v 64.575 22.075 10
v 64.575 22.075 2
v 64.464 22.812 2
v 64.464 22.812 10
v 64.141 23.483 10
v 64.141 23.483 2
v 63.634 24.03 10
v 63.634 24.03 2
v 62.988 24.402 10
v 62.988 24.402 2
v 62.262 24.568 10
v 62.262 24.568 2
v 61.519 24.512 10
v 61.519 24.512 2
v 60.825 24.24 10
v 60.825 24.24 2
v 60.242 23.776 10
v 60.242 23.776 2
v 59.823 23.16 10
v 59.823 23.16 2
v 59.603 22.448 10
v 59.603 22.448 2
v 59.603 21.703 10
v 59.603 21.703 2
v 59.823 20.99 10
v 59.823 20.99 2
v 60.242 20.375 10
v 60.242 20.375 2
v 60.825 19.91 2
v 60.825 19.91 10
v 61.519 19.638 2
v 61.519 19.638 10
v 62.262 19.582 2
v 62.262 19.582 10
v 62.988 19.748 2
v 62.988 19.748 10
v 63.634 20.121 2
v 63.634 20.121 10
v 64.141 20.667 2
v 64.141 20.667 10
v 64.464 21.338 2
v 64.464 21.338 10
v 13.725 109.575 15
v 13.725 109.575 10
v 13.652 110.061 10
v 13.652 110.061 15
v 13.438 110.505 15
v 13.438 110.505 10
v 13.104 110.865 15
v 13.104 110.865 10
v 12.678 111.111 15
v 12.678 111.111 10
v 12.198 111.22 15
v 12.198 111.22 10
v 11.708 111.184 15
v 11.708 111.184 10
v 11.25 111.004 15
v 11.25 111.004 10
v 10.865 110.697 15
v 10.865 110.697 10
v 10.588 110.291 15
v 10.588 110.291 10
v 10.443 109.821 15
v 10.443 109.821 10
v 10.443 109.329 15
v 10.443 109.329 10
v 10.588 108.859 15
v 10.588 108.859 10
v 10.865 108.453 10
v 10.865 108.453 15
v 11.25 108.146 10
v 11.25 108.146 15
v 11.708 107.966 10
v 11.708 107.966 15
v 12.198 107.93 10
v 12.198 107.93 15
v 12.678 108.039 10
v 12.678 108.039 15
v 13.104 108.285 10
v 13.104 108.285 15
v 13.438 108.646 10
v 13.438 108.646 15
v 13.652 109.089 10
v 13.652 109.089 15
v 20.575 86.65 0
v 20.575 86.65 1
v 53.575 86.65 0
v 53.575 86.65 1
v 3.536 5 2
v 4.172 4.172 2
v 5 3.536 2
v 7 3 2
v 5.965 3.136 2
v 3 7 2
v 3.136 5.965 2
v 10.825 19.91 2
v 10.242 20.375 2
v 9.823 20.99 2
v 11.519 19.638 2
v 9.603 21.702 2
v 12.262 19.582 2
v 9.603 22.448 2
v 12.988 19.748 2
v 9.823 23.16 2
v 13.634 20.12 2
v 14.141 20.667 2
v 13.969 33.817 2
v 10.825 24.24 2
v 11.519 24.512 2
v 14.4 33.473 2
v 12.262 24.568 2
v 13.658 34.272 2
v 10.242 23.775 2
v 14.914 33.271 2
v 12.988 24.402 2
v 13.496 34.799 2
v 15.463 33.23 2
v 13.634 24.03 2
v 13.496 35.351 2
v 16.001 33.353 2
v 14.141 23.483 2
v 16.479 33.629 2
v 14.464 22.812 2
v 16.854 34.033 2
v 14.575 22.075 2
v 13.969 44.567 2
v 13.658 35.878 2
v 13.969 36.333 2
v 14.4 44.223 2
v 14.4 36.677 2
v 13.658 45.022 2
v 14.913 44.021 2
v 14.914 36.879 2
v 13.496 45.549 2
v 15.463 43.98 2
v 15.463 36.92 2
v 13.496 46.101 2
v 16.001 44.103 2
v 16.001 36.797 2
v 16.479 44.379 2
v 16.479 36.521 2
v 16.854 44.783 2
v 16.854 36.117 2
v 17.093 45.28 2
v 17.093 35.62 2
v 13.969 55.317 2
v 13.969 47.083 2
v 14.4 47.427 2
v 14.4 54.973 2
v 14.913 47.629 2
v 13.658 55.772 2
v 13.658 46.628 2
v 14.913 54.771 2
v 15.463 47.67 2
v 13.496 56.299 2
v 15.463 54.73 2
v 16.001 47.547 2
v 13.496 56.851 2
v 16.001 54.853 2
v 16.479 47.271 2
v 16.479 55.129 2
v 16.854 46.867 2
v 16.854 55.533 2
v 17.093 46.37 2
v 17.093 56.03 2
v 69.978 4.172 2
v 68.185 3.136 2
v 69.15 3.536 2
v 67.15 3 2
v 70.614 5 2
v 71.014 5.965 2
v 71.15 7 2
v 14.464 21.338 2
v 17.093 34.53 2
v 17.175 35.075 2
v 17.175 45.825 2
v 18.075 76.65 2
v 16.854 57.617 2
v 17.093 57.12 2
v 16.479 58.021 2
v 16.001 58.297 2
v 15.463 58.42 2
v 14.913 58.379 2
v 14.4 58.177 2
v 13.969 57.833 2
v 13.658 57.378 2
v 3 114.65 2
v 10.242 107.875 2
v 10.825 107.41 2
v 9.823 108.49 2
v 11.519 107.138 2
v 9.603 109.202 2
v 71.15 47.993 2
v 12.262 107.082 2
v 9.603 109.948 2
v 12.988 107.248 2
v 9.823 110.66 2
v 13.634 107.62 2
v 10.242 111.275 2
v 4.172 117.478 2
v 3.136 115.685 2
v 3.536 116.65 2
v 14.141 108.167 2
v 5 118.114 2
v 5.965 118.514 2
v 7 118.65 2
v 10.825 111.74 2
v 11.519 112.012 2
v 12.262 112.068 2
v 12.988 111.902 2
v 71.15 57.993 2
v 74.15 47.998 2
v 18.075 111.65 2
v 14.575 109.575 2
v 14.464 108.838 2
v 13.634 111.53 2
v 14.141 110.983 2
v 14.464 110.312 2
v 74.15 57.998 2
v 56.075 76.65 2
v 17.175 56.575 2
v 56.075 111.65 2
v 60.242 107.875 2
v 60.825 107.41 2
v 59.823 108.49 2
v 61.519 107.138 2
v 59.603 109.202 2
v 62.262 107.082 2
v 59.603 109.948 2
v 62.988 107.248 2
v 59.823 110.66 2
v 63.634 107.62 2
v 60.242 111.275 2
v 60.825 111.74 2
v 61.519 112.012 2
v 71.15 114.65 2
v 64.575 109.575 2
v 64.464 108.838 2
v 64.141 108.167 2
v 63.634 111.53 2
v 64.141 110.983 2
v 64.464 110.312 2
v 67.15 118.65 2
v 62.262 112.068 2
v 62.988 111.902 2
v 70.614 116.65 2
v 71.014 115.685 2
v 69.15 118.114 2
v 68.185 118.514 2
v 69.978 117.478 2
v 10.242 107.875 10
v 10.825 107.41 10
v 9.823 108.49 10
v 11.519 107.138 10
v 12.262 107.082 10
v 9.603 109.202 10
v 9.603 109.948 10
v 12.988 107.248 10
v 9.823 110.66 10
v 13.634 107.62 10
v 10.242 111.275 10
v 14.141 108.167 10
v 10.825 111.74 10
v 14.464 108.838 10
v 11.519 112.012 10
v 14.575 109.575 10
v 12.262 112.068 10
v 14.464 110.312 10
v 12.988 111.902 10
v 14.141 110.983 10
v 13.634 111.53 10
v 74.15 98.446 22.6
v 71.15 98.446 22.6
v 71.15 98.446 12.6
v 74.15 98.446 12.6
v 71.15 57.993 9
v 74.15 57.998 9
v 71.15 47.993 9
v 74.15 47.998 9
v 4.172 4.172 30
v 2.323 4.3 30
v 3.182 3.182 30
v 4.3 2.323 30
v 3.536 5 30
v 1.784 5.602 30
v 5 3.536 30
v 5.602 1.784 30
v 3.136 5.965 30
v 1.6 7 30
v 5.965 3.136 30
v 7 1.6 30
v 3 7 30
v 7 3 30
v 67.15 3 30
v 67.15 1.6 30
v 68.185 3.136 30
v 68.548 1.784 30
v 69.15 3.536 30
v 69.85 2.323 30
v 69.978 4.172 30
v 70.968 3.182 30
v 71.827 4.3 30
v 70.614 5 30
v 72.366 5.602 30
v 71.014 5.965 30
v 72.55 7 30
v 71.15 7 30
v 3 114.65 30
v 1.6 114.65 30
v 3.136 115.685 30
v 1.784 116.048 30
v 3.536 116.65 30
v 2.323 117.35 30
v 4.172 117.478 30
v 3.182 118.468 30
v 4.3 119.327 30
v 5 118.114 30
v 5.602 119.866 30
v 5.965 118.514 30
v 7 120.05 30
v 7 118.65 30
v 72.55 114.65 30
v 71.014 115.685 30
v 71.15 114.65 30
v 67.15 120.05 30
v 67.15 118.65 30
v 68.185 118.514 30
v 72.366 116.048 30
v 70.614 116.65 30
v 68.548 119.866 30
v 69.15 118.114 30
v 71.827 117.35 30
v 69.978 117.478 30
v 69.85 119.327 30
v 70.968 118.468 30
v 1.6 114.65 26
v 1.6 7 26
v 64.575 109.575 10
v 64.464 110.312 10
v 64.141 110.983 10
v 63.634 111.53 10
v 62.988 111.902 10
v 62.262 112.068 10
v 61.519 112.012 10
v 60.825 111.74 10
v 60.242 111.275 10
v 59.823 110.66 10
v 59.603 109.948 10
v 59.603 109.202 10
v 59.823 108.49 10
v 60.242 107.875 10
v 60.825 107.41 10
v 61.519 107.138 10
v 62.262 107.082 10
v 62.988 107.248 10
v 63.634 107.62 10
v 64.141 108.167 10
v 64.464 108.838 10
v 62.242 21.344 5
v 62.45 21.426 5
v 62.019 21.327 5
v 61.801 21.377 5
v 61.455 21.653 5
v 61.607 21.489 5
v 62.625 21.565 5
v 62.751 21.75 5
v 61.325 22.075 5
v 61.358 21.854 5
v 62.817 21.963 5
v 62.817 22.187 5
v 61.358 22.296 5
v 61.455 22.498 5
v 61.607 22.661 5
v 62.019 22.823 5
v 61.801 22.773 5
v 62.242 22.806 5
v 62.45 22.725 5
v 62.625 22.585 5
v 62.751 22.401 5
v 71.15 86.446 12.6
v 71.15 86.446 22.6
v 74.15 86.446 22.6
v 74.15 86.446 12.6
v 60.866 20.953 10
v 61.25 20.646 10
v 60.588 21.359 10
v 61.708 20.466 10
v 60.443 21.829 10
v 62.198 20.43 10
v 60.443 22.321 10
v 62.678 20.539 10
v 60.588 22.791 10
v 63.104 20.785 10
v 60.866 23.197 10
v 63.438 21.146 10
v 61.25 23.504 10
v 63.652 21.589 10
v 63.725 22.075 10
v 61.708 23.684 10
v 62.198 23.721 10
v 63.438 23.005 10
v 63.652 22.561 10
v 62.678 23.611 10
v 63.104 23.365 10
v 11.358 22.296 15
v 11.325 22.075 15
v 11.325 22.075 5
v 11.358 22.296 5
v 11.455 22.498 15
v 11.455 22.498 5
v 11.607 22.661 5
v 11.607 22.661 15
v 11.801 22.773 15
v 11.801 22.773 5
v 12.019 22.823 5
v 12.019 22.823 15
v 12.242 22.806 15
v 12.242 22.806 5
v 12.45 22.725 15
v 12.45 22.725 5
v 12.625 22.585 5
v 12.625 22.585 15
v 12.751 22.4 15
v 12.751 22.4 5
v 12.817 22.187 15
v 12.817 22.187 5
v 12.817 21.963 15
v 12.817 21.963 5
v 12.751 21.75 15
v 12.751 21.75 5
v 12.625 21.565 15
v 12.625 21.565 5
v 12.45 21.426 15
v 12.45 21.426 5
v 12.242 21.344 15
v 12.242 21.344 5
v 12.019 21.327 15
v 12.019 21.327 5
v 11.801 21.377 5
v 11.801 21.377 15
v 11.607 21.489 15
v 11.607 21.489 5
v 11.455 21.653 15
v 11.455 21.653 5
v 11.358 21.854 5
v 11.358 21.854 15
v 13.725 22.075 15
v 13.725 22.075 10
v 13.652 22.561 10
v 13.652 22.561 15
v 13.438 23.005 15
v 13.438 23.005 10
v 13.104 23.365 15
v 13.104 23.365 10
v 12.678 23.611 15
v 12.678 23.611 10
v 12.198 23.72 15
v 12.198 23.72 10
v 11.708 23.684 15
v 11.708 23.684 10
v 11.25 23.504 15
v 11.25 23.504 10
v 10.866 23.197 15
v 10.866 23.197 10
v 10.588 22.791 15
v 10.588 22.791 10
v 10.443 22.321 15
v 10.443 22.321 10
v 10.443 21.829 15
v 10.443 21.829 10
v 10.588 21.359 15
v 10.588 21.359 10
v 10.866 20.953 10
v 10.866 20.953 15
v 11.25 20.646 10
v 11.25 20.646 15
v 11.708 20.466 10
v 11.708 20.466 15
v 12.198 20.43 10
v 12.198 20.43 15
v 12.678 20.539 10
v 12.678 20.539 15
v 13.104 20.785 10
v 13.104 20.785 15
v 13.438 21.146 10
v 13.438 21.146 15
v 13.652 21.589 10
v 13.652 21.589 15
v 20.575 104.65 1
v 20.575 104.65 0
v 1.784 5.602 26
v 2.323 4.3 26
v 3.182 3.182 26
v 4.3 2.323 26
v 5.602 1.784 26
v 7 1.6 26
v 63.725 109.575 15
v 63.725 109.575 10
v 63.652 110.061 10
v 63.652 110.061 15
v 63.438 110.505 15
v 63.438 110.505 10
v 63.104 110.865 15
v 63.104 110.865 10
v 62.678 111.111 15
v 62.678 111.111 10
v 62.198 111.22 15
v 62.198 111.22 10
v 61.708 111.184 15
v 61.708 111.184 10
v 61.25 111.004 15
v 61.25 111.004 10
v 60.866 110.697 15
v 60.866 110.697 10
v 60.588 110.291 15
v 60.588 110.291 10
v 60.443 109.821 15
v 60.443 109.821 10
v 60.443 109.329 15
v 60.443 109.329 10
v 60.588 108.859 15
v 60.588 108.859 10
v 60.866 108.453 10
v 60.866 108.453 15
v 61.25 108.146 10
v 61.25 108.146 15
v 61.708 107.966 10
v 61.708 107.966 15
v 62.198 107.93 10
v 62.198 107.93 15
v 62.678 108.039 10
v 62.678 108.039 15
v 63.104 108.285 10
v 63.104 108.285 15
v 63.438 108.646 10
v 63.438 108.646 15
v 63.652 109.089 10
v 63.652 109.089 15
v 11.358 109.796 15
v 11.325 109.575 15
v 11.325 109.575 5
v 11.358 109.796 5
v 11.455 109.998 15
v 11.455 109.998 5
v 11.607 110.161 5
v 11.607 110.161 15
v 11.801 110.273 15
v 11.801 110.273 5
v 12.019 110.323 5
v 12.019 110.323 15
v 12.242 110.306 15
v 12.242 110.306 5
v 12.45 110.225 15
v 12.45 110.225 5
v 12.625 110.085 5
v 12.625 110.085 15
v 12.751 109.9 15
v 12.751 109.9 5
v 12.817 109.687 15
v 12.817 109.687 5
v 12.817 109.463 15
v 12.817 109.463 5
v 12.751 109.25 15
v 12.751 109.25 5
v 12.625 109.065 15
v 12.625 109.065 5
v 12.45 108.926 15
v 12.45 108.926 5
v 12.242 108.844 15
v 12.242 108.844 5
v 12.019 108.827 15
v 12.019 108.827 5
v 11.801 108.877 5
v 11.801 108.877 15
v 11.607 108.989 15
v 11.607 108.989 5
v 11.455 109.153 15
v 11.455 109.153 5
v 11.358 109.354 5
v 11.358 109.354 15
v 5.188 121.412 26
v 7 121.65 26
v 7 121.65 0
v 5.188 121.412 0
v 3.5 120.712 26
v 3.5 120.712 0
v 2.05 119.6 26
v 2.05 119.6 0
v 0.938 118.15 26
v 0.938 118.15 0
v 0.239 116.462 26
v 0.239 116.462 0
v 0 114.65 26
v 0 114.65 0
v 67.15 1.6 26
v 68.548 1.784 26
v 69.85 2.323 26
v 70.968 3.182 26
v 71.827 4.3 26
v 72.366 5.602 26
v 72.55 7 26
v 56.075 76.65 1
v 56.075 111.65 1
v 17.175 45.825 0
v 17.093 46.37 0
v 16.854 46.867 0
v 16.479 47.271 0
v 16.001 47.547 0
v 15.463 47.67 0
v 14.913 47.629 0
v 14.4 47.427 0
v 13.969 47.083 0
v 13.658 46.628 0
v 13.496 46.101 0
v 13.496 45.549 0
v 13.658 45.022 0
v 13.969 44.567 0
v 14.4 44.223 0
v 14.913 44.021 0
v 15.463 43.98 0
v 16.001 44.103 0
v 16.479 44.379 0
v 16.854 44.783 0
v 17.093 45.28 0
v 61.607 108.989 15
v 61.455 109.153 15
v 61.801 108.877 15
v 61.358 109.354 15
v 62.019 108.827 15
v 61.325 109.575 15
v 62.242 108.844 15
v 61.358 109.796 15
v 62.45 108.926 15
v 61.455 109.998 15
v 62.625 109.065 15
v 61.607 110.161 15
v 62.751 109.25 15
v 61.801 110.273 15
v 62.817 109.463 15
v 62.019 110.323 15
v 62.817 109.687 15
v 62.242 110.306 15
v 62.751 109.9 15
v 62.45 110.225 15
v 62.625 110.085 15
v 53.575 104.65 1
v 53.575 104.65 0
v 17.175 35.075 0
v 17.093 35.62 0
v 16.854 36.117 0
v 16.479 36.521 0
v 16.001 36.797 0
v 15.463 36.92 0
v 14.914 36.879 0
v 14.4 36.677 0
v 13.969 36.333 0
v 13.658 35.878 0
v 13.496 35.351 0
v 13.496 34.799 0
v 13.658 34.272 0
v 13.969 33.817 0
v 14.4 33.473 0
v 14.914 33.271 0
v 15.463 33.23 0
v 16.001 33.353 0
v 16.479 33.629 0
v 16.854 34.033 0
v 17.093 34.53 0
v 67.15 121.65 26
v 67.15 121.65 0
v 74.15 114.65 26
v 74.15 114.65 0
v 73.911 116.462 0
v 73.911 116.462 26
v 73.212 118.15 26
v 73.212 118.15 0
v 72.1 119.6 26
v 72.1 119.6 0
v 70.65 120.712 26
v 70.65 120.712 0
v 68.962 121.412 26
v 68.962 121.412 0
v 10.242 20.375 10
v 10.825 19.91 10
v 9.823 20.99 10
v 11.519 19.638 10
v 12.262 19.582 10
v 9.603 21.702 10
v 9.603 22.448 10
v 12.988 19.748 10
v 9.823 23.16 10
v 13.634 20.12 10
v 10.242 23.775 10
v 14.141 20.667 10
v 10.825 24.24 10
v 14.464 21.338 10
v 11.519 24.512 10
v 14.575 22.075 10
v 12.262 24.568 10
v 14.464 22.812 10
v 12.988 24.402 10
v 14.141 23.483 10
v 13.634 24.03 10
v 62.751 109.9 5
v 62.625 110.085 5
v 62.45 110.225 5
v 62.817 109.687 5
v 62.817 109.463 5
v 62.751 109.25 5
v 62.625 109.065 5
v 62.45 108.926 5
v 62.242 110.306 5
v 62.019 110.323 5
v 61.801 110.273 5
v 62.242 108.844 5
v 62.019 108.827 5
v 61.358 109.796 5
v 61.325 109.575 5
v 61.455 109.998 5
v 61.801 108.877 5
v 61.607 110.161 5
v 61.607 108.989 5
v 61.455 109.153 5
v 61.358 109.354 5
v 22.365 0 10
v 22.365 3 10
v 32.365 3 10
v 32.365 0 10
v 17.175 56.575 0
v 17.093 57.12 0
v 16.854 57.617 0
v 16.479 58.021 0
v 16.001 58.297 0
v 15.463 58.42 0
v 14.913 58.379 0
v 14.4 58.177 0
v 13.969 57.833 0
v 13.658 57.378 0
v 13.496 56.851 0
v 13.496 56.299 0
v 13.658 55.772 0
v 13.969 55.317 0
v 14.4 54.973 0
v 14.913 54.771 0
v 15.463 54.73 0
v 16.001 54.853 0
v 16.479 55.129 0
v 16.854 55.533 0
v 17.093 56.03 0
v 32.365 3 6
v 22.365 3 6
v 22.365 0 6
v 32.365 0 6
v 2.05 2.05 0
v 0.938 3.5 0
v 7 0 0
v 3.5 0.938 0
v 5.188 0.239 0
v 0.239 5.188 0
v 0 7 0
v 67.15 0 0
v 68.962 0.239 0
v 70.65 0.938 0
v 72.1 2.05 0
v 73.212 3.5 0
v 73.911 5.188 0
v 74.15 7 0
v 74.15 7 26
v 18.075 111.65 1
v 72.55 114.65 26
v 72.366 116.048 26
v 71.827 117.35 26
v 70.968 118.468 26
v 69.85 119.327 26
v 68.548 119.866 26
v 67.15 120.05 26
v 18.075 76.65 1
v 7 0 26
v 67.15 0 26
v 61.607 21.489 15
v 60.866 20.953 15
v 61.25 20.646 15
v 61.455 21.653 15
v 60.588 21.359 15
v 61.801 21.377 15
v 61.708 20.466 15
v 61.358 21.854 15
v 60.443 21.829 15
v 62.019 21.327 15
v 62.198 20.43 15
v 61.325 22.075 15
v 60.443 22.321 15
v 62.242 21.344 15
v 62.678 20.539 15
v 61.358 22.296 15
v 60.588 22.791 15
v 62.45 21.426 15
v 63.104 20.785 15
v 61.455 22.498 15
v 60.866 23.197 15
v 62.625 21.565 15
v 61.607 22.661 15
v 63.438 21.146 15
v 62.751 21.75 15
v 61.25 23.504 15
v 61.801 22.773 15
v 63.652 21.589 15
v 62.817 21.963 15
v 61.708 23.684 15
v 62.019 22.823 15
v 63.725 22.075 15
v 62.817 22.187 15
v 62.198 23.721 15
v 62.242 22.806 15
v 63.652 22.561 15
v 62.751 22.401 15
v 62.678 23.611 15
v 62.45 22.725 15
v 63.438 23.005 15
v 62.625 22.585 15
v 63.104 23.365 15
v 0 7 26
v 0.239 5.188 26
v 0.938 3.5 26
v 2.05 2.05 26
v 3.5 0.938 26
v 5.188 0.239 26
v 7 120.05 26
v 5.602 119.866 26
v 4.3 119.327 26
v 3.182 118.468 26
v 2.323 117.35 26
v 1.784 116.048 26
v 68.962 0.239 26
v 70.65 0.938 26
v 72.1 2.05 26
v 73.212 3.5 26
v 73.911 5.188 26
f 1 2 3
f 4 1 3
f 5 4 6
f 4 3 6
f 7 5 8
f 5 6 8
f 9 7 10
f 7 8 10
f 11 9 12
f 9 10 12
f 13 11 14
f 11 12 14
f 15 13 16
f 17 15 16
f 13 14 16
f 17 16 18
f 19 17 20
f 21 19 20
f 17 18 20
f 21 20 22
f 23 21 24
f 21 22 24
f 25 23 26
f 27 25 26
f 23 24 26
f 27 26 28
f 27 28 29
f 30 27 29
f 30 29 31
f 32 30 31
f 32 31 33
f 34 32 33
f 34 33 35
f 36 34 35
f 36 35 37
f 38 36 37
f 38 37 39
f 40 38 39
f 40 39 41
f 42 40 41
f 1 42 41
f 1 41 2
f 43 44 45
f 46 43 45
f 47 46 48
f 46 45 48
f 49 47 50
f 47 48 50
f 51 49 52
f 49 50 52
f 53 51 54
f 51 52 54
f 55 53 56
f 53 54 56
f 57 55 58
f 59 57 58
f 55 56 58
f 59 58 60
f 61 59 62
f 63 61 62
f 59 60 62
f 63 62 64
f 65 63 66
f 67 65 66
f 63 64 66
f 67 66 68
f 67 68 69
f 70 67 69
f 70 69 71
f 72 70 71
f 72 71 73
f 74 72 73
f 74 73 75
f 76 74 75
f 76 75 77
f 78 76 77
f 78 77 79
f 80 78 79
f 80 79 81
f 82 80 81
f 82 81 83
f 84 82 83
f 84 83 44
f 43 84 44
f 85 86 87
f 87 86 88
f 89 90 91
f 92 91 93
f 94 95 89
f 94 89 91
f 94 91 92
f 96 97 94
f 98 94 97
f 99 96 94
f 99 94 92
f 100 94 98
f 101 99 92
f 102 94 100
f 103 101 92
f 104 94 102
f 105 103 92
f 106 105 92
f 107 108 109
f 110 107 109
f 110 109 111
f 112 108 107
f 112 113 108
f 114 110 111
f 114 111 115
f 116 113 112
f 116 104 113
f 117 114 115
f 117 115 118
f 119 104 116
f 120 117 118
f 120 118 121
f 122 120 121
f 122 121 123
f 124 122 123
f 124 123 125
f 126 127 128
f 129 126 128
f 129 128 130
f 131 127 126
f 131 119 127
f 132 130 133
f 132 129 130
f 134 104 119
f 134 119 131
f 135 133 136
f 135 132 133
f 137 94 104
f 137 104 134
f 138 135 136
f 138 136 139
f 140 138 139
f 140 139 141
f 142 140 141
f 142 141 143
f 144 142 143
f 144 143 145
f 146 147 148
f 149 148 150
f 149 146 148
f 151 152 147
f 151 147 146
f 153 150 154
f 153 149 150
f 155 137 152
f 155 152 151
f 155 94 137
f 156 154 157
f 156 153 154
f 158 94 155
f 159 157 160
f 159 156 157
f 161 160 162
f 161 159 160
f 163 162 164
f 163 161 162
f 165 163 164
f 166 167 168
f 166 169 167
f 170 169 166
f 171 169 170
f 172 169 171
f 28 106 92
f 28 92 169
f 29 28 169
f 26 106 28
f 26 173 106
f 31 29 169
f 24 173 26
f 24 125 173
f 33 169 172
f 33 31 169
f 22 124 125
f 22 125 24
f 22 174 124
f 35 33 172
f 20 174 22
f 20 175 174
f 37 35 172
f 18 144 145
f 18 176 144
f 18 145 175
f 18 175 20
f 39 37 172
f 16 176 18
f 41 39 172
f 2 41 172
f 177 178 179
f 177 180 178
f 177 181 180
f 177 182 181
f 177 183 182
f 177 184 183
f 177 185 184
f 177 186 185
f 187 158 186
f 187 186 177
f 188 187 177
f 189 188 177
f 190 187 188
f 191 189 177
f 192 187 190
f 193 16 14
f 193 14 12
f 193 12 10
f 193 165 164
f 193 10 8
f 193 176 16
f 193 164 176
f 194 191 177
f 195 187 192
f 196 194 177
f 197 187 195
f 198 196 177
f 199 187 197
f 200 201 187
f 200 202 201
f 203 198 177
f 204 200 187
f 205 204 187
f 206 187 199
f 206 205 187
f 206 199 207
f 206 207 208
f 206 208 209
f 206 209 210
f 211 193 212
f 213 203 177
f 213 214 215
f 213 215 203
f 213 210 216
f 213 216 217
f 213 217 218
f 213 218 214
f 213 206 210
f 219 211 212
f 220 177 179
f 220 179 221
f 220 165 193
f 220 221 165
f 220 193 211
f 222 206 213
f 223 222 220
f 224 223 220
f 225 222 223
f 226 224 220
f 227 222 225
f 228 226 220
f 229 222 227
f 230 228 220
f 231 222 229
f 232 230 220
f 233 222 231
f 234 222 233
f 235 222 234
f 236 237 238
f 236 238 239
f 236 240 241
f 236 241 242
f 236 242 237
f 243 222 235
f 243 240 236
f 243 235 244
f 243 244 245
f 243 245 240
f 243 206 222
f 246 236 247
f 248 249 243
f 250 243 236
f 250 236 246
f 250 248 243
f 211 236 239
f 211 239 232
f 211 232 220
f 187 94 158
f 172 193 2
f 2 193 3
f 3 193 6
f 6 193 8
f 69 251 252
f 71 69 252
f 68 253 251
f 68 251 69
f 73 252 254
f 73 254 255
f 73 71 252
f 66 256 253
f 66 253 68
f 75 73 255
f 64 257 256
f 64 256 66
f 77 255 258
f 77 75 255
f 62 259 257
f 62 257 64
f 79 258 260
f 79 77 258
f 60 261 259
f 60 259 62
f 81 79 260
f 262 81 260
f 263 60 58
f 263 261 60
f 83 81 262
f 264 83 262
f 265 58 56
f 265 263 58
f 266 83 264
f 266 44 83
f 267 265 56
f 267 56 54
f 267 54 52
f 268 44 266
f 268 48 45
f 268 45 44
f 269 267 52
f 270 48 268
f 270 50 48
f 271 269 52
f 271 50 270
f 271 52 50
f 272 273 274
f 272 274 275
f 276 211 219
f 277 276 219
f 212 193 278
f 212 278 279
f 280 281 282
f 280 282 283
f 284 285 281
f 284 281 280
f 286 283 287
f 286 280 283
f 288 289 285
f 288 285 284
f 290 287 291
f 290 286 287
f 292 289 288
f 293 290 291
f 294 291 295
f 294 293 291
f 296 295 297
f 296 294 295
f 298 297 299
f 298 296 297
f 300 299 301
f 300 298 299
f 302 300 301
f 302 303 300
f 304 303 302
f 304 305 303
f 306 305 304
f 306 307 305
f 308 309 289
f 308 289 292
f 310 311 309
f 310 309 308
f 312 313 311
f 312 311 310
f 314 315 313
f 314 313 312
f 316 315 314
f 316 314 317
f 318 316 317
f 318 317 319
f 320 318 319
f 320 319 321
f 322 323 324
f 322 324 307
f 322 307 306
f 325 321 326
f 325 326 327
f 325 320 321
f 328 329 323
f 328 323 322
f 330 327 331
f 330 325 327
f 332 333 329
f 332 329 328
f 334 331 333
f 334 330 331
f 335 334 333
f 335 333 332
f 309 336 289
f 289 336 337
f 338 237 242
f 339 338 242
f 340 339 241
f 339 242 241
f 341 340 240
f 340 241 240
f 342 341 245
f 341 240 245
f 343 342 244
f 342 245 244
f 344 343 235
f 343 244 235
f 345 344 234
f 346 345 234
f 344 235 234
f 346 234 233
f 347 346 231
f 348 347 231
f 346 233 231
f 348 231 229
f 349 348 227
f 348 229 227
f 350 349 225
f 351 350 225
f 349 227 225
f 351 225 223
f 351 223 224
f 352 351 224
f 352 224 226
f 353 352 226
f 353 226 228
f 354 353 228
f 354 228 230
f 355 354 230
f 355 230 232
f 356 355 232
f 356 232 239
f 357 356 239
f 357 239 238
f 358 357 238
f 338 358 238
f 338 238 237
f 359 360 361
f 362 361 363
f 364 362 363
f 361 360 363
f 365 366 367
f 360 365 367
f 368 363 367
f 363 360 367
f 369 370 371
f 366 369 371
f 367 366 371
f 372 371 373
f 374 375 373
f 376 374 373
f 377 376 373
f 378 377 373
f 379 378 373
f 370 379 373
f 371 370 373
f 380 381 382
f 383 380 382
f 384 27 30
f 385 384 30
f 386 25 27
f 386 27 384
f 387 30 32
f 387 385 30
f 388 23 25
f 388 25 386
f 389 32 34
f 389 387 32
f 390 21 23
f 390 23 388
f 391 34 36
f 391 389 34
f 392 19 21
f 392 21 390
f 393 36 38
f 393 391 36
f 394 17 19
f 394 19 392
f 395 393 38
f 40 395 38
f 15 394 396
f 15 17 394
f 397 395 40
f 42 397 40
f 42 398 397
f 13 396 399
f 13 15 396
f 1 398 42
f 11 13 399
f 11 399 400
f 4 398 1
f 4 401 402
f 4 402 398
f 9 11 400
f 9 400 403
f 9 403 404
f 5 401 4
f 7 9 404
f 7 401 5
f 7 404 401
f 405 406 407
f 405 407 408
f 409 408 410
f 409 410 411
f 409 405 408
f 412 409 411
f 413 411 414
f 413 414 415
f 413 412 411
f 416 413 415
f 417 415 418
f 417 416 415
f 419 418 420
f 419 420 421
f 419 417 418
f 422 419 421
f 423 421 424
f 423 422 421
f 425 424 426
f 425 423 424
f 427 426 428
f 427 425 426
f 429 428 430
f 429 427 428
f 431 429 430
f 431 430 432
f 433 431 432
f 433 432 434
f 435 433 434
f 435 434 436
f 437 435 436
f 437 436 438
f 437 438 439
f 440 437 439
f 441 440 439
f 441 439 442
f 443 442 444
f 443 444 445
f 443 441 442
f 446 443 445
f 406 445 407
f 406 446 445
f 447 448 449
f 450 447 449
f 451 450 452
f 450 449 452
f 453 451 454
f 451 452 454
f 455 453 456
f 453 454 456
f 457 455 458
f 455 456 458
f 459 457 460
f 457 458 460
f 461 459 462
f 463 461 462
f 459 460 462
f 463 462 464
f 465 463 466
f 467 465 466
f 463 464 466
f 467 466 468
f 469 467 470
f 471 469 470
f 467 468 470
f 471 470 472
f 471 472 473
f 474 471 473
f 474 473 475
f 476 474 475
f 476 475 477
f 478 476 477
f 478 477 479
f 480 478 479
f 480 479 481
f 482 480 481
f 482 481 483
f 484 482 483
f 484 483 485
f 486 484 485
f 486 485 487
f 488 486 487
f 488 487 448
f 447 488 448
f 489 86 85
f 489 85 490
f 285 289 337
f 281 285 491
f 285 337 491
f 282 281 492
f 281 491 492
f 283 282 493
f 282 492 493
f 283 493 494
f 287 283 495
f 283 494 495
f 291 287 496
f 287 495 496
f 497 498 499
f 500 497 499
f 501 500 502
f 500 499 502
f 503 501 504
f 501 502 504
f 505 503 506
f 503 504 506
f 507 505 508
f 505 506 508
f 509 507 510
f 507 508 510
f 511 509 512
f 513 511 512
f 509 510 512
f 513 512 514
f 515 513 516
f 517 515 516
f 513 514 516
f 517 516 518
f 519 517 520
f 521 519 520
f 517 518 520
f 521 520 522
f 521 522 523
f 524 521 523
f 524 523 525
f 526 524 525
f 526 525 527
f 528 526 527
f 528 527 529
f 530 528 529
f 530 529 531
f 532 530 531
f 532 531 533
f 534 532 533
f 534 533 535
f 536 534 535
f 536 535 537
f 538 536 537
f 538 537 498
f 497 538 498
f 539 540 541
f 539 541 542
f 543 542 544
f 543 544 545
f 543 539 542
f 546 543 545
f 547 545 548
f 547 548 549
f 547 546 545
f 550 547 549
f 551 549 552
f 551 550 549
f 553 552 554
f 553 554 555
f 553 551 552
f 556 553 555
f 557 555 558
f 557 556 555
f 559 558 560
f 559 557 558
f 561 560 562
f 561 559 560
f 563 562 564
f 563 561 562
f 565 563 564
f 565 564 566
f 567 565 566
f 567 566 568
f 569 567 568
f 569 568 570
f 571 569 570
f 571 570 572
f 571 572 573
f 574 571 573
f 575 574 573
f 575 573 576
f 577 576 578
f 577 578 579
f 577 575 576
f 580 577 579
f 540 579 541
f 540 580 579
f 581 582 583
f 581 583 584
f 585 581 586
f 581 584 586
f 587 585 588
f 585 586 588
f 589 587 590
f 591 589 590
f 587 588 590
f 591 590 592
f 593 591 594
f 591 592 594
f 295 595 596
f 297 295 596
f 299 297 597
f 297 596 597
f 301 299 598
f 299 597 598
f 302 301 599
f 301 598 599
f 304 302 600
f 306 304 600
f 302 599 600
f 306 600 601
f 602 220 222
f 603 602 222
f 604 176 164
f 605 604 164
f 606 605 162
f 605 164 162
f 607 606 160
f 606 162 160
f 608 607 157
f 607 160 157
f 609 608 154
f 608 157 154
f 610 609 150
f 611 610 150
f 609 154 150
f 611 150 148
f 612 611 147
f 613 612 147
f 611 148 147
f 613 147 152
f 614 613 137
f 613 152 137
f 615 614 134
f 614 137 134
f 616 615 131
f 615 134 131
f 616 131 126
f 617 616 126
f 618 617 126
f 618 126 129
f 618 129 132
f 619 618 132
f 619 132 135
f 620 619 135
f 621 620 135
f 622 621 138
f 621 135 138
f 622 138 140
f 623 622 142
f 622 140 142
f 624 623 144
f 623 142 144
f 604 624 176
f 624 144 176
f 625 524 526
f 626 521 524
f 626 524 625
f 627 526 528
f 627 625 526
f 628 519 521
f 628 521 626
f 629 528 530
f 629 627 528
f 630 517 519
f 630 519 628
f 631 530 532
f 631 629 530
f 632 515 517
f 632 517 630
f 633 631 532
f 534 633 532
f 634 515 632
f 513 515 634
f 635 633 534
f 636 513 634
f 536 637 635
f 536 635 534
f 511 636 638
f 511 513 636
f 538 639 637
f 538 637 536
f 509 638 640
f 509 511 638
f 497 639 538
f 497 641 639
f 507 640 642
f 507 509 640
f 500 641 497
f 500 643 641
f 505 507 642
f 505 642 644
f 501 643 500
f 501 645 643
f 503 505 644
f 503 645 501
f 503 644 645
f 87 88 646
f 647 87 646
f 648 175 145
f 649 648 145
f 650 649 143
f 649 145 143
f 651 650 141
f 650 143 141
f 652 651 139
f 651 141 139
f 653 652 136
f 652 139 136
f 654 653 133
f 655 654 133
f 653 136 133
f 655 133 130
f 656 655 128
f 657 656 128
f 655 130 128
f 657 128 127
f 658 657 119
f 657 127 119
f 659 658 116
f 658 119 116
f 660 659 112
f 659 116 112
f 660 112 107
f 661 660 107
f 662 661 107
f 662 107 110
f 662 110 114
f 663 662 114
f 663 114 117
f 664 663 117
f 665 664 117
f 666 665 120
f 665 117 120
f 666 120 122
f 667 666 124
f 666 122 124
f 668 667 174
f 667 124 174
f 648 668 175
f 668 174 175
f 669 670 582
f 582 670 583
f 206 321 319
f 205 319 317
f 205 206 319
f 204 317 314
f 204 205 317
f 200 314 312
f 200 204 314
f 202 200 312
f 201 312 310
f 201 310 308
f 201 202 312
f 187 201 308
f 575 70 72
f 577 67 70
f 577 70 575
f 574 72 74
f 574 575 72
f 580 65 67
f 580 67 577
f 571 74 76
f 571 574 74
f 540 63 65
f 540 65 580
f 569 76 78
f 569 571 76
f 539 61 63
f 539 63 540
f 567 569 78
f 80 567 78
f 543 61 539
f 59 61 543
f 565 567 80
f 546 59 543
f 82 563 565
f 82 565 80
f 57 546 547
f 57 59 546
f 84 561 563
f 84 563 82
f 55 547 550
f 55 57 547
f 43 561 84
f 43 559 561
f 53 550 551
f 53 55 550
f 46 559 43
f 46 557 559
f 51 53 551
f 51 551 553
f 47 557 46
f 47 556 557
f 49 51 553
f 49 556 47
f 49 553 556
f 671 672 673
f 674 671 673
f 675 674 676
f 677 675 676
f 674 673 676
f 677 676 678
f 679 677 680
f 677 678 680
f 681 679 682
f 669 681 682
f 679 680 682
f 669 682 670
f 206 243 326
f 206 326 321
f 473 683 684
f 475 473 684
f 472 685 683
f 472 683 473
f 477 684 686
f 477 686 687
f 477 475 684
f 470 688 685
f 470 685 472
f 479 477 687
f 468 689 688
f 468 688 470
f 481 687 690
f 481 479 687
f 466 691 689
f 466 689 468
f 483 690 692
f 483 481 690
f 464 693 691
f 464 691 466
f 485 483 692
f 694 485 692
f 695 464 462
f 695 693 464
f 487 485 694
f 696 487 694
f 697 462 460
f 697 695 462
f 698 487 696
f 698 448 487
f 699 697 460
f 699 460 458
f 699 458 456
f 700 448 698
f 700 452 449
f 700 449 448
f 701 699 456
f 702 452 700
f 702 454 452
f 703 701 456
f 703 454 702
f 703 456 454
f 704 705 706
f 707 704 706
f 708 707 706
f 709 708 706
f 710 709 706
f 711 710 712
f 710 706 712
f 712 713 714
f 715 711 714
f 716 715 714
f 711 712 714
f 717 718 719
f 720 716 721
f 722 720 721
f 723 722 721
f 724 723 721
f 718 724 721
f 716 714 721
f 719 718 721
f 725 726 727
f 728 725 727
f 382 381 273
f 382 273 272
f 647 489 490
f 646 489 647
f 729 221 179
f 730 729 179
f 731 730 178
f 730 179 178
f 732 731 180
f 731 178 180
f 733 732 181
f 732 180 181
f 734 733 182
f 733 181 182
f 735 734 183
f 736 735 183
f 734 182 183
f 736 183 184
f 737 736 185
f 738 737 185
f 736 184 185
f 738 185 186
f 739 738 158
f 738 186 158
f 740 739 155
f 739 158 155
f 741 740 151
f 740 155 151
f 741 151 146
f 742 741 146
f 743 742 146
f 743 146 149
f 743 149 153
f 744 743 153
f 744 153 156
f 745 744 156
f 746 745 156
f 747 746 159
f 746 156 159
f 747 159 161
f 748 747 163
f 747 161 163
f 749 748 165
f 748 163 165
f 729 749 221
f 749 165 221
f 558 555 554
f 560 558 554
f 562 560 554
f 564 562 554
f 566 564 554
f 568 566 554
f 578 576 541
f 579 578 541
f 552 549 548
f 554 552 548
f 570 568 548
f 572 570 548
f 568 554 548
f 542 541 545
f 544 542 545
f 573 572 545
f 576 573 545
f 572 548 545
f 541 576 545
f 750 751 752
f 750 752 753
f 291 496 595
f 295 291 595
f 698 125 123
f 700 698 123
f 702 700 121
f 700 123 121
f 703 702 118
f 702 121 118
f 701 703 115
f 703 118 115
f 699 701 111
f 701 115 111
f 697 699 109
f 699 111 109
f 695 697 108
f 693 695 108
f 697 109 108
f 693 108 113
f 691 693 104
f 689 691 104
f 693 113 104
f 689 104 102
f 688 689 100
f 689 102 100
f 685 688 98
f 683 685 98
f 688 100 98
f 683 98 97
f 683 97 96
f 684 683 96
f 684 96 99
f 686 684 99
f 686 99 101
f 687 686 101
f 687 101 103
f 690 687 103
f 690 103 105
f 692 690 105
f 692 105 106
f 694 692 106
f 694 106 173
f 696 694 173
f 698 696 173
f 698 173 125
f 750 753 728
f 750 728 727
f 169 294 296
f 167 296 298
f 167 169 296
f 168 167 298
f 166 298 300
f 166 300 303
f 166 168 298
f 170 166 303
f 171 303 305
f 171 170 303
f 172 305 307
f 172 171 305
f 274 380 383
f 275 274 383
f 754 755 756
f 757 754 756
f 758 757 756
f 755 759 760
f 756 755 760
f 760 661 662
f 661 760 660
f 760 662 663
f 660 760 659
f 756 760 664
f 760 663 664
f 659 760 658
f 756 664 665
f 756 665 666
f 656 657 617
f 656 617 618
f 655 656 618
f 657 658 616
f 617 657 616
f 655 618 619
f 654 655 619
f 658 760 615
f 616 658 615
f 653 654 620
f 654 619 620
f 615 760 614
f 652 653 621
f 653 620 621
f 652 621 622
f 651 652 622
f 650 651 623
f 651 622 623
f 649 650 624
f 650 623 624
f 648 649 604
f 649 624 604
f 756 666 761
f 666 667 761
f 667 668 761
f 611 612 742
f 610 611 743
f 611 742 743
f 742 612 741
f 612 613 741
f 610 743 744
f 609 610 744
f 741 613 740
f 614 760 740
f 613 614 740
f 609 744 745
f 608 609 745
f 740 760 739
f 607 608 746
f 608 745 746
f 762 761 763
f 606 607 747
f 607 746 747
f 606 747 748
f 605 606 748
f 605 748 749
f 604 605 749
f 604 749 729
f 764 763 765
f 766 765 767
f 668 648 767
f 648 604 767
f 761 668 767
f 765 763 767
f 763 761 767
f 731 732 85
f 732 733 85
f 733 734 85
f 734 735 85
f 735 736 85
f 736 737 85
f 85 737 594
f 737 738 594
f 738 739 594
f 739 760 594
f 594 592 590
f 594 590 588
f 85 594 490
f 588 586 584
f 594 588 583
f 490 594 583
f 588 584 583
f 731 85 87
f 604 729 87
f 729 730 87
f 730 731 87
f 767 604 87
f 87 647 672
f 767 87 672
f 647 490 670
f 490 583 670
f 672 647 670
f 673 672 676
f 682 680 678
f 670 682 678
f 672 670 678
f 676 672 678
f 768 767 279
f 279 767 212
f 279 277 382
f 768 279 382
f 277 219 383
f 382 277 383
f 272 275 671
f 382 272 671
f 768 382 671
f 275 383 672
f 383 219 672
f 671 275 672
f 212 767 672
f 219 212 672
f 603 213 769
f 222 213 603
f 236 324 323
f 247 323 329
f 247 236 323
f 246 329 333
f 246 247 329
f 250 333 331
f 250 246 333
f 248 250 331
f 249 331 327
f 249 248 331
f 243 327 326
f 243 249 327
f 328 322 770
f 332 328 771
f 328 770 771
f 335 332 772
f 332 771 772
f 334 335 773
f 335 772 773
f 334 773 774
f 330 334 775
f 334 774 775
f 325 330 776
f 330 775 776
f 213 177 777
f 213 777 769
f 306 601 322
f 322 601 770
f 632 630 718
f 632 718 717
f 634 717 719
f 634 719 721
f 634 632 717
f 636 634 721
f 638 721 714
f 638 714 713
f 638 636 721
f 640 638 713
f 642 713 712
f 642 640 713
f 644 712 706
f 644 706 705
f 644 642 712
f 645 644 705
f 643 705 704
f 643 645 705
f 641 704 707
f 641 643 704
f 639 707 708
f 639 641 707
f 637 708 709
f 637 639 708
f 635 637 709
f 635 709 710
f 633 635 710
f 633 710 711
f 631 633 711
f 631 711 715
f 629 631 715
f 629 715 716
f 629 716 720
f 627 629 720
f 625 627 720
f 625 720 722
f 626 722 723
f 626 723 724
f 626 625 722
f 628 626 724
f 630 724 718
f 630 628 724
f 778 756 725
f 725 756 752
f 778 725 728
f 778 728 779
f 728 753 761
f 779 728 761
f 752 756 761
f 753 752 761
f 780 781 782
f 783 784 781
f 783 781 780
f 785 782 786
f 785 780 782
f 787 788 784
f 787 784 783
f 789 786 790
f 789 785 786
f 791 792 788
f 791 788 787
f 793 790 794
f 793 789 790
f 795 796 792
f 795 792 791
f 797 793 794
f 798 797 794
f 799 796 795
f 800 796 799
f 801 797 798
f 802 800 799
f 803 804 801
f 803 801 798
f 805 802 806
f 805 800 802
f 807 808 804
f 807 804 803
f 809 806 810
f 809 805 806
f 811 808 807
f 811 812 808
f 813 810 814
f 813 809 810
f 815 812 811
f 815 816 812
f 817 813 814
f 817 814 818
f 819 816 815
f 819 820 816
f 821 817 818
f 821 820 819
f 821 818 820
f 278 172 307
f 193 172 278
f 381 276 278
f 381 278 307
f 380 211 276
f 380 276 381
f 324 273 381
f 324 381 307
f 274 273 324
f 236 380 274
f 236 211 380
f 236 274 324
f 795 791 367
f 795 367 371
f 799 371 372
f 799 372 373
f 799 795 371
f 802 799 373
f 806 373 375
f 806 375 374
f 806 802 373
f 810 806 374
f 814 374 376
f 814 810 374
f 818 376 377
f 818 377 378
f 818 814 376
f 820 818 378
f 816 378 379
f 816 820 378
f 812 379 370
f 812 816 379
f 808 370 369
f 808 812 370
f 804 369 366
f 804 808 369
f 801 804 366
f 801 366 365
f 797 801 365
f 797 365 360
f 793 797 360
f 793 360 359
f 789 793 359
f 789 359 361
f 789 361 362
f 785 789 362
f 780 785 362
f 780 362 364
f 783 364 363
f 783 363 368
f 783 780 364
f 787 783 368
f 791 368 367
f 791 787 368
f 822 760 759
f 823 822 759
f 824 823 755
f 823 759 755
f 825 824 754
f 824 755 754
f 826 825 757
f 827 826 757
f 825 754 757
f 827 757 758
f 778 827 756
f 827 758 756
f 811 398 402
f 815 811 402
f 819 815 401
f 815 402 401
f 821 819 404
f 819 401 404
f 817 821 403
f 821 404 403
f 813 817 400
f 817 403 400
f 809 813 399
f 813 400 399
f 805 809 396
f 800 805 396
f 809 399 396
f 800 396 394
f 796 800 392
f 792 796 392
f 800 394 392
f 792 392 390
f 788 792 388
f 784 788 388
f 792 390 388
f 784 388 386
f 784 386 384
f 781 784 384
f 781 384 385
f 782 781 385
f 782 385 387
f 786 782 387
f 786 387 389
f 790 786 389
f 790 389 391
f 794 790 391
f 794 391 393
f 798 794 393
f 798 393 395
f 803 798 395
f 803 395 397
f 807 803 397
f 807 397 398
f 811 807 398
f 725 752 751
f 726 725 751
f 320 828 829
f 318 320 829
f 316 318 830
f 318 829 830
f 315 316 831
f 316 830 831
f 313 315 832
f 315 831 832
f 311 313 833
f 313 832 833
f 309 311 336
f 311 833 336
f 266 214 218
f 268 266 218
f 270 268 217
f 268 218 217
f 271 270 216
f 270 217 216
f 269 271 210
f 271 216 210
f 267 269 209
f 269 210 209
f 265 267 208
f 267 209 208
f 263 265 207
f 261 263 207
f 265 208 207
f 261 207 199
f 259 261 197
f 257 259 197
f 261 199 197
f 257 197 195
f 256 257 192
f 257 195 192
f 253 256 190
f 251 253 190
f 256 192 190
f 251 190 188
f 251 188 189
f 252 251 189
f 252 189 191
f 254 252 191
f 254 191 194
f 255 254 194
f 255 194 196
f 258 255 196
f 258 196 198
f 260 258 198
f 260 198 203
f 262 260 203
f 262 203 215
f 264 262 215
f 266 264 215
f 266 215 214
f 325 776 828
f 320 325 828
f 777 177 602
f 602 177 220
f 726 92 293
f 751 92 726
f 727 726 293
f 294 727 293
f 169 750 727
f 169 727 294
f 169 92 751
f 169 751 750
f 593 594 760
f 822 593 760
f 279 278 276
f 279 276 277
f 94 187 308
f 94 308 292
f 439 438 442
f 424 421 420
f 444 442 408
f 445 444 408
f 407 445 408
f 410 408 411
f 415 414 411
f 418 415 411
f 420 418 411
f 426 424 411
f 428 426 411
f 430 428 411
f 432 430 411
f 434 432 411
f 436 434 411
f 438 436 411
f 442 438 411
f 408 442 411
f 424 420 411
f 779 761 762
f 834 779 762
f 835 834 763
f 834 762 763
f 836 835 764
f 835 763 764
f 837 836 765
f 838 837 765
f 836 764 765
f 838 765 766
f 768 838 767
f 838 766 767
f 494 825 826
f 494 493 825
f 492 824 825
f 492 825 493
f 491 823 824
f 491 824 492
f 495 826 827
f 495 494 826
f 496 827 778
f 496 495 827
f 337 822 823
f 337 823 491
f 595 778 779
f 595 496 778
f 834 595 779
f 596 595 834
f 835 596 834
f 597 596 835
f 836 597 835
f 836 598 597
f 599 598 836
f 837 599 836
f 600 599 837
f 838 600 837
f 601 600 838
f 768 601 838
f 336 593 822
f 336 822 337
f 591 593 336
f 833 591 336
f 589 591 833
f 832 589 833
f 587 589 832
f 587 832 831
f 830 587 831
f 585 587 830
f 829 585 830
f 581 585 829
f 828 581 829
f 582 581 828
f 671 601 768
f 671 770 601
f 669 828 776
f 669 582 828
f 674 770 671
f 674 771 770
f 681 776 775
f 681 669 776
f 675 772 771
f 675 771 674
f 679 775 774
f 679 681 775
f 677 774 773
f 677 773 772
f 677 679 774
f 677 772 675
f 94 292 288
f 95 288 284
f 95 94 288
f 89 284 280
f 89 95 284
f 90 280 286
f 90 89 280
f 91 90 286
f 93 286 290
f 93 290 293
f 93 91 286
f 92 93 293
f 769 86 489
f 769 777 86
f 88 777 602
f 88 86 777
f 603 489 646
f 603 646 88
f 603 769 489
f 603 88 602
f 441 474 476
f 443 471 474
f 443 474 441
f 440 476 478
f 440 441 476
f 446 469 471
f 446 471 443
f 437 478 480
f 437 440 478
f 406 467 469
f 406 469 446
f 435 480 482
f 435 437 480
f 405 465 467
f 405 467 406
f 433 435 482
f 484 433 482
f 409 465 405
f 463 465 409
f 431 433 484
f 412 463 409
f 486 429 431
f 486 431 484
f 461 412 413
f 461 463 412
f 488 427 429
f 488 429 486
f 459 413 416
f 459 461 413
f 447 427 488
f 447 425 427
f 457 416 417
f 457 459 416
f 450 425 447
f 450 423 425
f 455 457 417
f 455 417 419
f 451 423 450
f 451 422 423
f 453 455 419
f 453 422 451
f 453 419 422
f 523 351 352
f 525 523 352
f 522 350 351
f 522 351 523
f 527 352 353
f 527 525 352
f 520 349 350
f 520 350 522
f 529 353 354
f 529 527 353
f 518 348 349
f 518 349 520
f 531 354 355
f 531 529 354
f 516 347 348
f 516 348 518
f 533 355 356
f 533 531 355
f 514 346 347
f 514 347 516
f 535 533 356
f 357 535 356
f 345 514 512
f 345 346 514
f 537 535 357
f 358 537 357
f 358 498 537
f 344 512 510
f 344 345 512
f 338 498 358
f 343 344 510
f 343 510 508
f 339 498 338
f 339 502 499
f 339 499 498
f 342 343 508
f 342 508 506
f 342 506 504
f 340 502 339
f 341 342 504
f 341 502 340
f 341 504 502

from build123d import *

# Parameters (mm, degrees)
PAD_DEPTH         = 2
SKETCH004_W       = 38
SKETCH004_H       = 35
POCKET_DEPTH      = 1
SKETCH003_W       = 33
SKETCH003_H       = 18
POCKET001_DEPTH   = 2
SKETCH005_R       = 1.85
POCKET002_DEPTH   = 2
SKETCH006_R       = 2.5
PAD001_DEPTH      = 10
SKETCH007_R       = 1.65
PAD002_DEPTH      = 15
PAD003_DEPTH      = 26
PAD004_DEPTH      = 30
CYLINDER_R        = 0.75
CYLINDER_DEPTH    = 10
CYLINDER001_R     = 0.75
CYLINDER001_DEPTH = 10
CYLINDER002_R     = 0.75
CYLINDER002_DEPTH = 10
CYLINDER003_R     = 0.75
CYLINDER003_DEPTH = 10
SKETCH008_W       = 3
SKETCH008_H       = 12
POCKET003_DEPTH   = 10
BOX_W             = 4
BOX_H             = 10
BOX_DEPTH         = 7
SKETCH009_W       = 10.000002
SKETCH009_H       = 3
POCKET004_DEPTH   = 4


with BuildPart() as part:
    # Sketch → Pad (new body)
    with BuildSketch(Plane.XY):
        with BuildLine():
            Line((0, 114.650046), (0, 7))
            ThreePointArc((0, 7), (2.050253, 2.050253), (7, 0))
            Line((7, 0), (67.149994, 0))
            ThreePointArc((67.149994, 0), (72.099741, 2.050253), (74.149994, 7))
            Line((74.149994, 7), (74.149994, 114.650046))
            ThreePointArc((74.149994, 114.650046), (72.099741, 119.599793), (67.149994, 121.650046))
            Line((67.149994, 121.650046), (7, 121.650046))
            ThreePointArc((7, 121.650046), (2.050253, 119.599793), (0, 114.650046))
        make_face()
    extrude(amount=PAD_DEPTH)

    # Sketch004 → Pocket (cut)
    with BuildSketch(Plane.XY.offset(2)):
        with Locations((37.074997, 94.150046)):
            Rectangle(SKETCH004_W, SKETCH004_H)
    extrude(amount=-POCKET_DEPTH, mode=Mode.SUBTRACT)

    # Sketch003 → Pocket001 (cut)
    with BuildSketch(Plane.XY.offset(2)):
        with Locations((37.074997, 95.650046)):
            Rectangle(SKETCH003_W, SKETCH003_H)
    extrude(amount=-POCKET001_DEPTH, mode=Mode.SUBTRACT)

    # Sketch005 → Pocket002 (cut)
    with BuildSketch(Plane.XY.offset(2)):
        with Locations((15.325171, 35.075006)):
            Circle(SKETCH005_R)
        with Locations((15.325058, 45.825065)):
            Circle(SKETCH005_R)
        with Locations((15.325117, 56.575053)):
            Circle(SKETCH005_R)
    extrude(amount=-POCKET002_DEPTH, mode=Mode.SUBTRACT)

    # Sketch006 → Pad001 (join)
    with BuildSketch(Plane.XY):
        with Locations((62.075039, 22.075116)):
            Circle(SKETCH006_R)
        with Locations((12.075062, 22.075062)):
            Circle(SKETCH006_R)
        with Locations((12.075024, 109.57503)):
            Circle(SKETCH006_R)
        with Locations((62.075044, 109.575056)):
            Circle(SKETCH006_R)
    extrude(amount=PAD001_DEPTH)

    # Sketch007 → Pad002 (join)
    with BuildSketch(Plane.XY):
        with Locations((62.075039, 22.075116)):
            Circle(SKETCH007_R)
        with Locations((12.075062, 22.075062)):
            Circle(SKETCH007_R)
        with Locations((62.075044, 109.575056)):
            Circle(SKETCH007_R)
        with Locations((12.075024, 109.57503)):
            Circle(SKETCH007_R)
    extrude(amount=PAD002_DEPTH)

    # Sketch001 → Pad003 (join)
    with BuildSketch(Plane.XY):
        with BuildLine():
            Line((0, 114.650046), (0, 7))
            ThreePointArc((0, 7), (2.050253, 2.050253), (7, 0))
            Line((7, 0), (67.149994, 0))
            ThreePointArc((67.149994, 0), (72.099741, 2.050253), (74.149994, 7))
            Line((74.149994, 7), (74.149994, 114.650046))
            ThreePointArc((74.149994, 114.650046), (72.099741, 119.599793), (67.149994, 121.650046))
            Line((67.149994, 121.650046), (7, 121.650046))
            ThreePointArc((7, 121.650046), (2.050253, 119.599793), (0, 114.650046))
        make_face()
        with BuildLine():
            Line((67.149994, 118.650046), (7, 118.650046))
            ThreePointArc((7, 118.650046), (4.171573, 117.478473), (3, 114.650046))
            Line((3, 114.650046), (3, 7))
            ThreePointArc((3, 7), (4.171573, 4.171573), (7, 3))
            Line((7, 3), (67.149994, 3))
            ThreePointArc((67.149994, 3), (69.978421, 4.171573), (71.149994, 7))
            Line((71.149994, 7), (71.149994, 114.650046))
            ThreePointArc((71.149994, 114.650046), (69.978421, 117.478473), (67.149994, 118.650046))
        make_face(mode=Mode.SUBTRACT)
    extrude(amount=PAD003_DEPTH)

    # Sketch002 → Pad004 (join)
    with BuildSketch(Plane.XY):
        with BuildLine():
            Line((67.149994, 120.050046), (7, 120.050046))
            ThreePointArc((7, 120.050046), (3.181623, 118.468423), (1.6, 114.650046))
            Line((1.6, 114.650046), (1.6, 7))
            ThreePointArc((1.6, 7), (3.181623, 3.181623), (7, 1.6))
            Line((7, 1.6), (67.149994, 1.6))
            ThreePointArc((67.149994, 1.6), (70.968371, 3.181623), (72.549994, 7))
            Line((72.549994, 7), (72.549994, 114.650046))
            ThreePointArc((72.549994, 114.650046), (70.968371, 118.468423), (67.149994, 120.050046))
        make_face()
        with BuildLine():
            Line((67.149994, 118.650046), (7, 118.650046))
            ThreePointArc((7, 118.650046), (4.171573, 117.478473), (3, 114.650046))
            Line((3, 114.650046), (3, 7))
            ThreePointArc((3, 7), (4.171573, 4.171573), (7, 3))
            Line((7, 3), (67.149994, 3))
            ThreePointArc((67.149994, 3), (69.978421, 4.171573), (71.149994, 7))
            Line((71.149994, 7), (71.149994, 114.650046))
            ThreePointArc((71.149994, 114.650046), (69.978421, 117.478473), (67.149994, 118.650046))
        make_face(mode=Mode.SUBTRACT)
    extrude(amount=PAD004_DEPTH)

    # Cylinder → Cylinder (cut)
    with BuildSketch(Plane(origin=(12.075062, 22.075062, 15), x_dir=(-1, 0, 0), z_dir=(0, 0, -1))):
        Circle(CYLINDER_R)
    extrude(amount=CYLINDER_DEPTH, mode=Mode.SUBTRACT)

    # Cylinder001 → Cylinder001 (cut)
    with BuildSketch(Plane(origin=(62.075039, 22.075116, 15), x_dir=(-1, 0, 0), z_dir=(0, 0, -1))):
        Circle(CYLINDER001_R)
    extrude(amount=CYLINDER001_DEPTH, mode=Mode.SUBTRACT)

    # Cylinder002 → Cylinder002 (cut)
    with BuildSketch(Plane(origin=(62.075044, 109.575056, 15), x_dir=(-1, 0, 0), z_dir=(0, 0, -1))):
        Circle(CYLINDER002_R)
    extrude(amount=CYLINDER002_DEPTH, mode=Mode.SUBTRACT)

    # Cylinder003 → Cylinder003 (cut)
    with BuildSketch(Plane(origin=(12.075024, 109.57503, 15), x_dir=(-1, 0, 0), z_dir=(0, 0, -1))):
        Circle(CYLINDER003_R)
    extrude(amount=CYLINDER003_DEPTH, mode=Mode.SUBTRACT)

    # Sketch008 → Pocket003 (cut)
    with BuildSketch(Plane.XY.offset(12.6)):
        with Locations((72.649994, 92.446222)):
            Rectangle(SKETCH008_W, SKETCH008_H)
    extrude(amount=POCKET003_DEPTH, mode=Mode.SUBTRACT)

    # Box → Box (cut)
    with BuildSketch(Plane(origin=(70.192996, 47.991786, 2), x_dir=(0.999999, 0.001479, 0), z_dir=(0, 0, 1))):
        with Locations((2, 5)):
            Rectangle(BOX_W, BOX_H)
    extrude(amount=BOX_DEPTH, mode=Mode.SUBTRACT)

    # Sketch009 → Pocket004 (cut)
    with BuildSketch(Plane.XY.offset(6)):
        with Locations((27.364886, 1.5)):
            Rectangle(SKETCH009_W, SKETCH009_H)
    extrude(amount=POCKET004_DEPTH, mode=Mode.SUBTRACT)


solid = part.part
